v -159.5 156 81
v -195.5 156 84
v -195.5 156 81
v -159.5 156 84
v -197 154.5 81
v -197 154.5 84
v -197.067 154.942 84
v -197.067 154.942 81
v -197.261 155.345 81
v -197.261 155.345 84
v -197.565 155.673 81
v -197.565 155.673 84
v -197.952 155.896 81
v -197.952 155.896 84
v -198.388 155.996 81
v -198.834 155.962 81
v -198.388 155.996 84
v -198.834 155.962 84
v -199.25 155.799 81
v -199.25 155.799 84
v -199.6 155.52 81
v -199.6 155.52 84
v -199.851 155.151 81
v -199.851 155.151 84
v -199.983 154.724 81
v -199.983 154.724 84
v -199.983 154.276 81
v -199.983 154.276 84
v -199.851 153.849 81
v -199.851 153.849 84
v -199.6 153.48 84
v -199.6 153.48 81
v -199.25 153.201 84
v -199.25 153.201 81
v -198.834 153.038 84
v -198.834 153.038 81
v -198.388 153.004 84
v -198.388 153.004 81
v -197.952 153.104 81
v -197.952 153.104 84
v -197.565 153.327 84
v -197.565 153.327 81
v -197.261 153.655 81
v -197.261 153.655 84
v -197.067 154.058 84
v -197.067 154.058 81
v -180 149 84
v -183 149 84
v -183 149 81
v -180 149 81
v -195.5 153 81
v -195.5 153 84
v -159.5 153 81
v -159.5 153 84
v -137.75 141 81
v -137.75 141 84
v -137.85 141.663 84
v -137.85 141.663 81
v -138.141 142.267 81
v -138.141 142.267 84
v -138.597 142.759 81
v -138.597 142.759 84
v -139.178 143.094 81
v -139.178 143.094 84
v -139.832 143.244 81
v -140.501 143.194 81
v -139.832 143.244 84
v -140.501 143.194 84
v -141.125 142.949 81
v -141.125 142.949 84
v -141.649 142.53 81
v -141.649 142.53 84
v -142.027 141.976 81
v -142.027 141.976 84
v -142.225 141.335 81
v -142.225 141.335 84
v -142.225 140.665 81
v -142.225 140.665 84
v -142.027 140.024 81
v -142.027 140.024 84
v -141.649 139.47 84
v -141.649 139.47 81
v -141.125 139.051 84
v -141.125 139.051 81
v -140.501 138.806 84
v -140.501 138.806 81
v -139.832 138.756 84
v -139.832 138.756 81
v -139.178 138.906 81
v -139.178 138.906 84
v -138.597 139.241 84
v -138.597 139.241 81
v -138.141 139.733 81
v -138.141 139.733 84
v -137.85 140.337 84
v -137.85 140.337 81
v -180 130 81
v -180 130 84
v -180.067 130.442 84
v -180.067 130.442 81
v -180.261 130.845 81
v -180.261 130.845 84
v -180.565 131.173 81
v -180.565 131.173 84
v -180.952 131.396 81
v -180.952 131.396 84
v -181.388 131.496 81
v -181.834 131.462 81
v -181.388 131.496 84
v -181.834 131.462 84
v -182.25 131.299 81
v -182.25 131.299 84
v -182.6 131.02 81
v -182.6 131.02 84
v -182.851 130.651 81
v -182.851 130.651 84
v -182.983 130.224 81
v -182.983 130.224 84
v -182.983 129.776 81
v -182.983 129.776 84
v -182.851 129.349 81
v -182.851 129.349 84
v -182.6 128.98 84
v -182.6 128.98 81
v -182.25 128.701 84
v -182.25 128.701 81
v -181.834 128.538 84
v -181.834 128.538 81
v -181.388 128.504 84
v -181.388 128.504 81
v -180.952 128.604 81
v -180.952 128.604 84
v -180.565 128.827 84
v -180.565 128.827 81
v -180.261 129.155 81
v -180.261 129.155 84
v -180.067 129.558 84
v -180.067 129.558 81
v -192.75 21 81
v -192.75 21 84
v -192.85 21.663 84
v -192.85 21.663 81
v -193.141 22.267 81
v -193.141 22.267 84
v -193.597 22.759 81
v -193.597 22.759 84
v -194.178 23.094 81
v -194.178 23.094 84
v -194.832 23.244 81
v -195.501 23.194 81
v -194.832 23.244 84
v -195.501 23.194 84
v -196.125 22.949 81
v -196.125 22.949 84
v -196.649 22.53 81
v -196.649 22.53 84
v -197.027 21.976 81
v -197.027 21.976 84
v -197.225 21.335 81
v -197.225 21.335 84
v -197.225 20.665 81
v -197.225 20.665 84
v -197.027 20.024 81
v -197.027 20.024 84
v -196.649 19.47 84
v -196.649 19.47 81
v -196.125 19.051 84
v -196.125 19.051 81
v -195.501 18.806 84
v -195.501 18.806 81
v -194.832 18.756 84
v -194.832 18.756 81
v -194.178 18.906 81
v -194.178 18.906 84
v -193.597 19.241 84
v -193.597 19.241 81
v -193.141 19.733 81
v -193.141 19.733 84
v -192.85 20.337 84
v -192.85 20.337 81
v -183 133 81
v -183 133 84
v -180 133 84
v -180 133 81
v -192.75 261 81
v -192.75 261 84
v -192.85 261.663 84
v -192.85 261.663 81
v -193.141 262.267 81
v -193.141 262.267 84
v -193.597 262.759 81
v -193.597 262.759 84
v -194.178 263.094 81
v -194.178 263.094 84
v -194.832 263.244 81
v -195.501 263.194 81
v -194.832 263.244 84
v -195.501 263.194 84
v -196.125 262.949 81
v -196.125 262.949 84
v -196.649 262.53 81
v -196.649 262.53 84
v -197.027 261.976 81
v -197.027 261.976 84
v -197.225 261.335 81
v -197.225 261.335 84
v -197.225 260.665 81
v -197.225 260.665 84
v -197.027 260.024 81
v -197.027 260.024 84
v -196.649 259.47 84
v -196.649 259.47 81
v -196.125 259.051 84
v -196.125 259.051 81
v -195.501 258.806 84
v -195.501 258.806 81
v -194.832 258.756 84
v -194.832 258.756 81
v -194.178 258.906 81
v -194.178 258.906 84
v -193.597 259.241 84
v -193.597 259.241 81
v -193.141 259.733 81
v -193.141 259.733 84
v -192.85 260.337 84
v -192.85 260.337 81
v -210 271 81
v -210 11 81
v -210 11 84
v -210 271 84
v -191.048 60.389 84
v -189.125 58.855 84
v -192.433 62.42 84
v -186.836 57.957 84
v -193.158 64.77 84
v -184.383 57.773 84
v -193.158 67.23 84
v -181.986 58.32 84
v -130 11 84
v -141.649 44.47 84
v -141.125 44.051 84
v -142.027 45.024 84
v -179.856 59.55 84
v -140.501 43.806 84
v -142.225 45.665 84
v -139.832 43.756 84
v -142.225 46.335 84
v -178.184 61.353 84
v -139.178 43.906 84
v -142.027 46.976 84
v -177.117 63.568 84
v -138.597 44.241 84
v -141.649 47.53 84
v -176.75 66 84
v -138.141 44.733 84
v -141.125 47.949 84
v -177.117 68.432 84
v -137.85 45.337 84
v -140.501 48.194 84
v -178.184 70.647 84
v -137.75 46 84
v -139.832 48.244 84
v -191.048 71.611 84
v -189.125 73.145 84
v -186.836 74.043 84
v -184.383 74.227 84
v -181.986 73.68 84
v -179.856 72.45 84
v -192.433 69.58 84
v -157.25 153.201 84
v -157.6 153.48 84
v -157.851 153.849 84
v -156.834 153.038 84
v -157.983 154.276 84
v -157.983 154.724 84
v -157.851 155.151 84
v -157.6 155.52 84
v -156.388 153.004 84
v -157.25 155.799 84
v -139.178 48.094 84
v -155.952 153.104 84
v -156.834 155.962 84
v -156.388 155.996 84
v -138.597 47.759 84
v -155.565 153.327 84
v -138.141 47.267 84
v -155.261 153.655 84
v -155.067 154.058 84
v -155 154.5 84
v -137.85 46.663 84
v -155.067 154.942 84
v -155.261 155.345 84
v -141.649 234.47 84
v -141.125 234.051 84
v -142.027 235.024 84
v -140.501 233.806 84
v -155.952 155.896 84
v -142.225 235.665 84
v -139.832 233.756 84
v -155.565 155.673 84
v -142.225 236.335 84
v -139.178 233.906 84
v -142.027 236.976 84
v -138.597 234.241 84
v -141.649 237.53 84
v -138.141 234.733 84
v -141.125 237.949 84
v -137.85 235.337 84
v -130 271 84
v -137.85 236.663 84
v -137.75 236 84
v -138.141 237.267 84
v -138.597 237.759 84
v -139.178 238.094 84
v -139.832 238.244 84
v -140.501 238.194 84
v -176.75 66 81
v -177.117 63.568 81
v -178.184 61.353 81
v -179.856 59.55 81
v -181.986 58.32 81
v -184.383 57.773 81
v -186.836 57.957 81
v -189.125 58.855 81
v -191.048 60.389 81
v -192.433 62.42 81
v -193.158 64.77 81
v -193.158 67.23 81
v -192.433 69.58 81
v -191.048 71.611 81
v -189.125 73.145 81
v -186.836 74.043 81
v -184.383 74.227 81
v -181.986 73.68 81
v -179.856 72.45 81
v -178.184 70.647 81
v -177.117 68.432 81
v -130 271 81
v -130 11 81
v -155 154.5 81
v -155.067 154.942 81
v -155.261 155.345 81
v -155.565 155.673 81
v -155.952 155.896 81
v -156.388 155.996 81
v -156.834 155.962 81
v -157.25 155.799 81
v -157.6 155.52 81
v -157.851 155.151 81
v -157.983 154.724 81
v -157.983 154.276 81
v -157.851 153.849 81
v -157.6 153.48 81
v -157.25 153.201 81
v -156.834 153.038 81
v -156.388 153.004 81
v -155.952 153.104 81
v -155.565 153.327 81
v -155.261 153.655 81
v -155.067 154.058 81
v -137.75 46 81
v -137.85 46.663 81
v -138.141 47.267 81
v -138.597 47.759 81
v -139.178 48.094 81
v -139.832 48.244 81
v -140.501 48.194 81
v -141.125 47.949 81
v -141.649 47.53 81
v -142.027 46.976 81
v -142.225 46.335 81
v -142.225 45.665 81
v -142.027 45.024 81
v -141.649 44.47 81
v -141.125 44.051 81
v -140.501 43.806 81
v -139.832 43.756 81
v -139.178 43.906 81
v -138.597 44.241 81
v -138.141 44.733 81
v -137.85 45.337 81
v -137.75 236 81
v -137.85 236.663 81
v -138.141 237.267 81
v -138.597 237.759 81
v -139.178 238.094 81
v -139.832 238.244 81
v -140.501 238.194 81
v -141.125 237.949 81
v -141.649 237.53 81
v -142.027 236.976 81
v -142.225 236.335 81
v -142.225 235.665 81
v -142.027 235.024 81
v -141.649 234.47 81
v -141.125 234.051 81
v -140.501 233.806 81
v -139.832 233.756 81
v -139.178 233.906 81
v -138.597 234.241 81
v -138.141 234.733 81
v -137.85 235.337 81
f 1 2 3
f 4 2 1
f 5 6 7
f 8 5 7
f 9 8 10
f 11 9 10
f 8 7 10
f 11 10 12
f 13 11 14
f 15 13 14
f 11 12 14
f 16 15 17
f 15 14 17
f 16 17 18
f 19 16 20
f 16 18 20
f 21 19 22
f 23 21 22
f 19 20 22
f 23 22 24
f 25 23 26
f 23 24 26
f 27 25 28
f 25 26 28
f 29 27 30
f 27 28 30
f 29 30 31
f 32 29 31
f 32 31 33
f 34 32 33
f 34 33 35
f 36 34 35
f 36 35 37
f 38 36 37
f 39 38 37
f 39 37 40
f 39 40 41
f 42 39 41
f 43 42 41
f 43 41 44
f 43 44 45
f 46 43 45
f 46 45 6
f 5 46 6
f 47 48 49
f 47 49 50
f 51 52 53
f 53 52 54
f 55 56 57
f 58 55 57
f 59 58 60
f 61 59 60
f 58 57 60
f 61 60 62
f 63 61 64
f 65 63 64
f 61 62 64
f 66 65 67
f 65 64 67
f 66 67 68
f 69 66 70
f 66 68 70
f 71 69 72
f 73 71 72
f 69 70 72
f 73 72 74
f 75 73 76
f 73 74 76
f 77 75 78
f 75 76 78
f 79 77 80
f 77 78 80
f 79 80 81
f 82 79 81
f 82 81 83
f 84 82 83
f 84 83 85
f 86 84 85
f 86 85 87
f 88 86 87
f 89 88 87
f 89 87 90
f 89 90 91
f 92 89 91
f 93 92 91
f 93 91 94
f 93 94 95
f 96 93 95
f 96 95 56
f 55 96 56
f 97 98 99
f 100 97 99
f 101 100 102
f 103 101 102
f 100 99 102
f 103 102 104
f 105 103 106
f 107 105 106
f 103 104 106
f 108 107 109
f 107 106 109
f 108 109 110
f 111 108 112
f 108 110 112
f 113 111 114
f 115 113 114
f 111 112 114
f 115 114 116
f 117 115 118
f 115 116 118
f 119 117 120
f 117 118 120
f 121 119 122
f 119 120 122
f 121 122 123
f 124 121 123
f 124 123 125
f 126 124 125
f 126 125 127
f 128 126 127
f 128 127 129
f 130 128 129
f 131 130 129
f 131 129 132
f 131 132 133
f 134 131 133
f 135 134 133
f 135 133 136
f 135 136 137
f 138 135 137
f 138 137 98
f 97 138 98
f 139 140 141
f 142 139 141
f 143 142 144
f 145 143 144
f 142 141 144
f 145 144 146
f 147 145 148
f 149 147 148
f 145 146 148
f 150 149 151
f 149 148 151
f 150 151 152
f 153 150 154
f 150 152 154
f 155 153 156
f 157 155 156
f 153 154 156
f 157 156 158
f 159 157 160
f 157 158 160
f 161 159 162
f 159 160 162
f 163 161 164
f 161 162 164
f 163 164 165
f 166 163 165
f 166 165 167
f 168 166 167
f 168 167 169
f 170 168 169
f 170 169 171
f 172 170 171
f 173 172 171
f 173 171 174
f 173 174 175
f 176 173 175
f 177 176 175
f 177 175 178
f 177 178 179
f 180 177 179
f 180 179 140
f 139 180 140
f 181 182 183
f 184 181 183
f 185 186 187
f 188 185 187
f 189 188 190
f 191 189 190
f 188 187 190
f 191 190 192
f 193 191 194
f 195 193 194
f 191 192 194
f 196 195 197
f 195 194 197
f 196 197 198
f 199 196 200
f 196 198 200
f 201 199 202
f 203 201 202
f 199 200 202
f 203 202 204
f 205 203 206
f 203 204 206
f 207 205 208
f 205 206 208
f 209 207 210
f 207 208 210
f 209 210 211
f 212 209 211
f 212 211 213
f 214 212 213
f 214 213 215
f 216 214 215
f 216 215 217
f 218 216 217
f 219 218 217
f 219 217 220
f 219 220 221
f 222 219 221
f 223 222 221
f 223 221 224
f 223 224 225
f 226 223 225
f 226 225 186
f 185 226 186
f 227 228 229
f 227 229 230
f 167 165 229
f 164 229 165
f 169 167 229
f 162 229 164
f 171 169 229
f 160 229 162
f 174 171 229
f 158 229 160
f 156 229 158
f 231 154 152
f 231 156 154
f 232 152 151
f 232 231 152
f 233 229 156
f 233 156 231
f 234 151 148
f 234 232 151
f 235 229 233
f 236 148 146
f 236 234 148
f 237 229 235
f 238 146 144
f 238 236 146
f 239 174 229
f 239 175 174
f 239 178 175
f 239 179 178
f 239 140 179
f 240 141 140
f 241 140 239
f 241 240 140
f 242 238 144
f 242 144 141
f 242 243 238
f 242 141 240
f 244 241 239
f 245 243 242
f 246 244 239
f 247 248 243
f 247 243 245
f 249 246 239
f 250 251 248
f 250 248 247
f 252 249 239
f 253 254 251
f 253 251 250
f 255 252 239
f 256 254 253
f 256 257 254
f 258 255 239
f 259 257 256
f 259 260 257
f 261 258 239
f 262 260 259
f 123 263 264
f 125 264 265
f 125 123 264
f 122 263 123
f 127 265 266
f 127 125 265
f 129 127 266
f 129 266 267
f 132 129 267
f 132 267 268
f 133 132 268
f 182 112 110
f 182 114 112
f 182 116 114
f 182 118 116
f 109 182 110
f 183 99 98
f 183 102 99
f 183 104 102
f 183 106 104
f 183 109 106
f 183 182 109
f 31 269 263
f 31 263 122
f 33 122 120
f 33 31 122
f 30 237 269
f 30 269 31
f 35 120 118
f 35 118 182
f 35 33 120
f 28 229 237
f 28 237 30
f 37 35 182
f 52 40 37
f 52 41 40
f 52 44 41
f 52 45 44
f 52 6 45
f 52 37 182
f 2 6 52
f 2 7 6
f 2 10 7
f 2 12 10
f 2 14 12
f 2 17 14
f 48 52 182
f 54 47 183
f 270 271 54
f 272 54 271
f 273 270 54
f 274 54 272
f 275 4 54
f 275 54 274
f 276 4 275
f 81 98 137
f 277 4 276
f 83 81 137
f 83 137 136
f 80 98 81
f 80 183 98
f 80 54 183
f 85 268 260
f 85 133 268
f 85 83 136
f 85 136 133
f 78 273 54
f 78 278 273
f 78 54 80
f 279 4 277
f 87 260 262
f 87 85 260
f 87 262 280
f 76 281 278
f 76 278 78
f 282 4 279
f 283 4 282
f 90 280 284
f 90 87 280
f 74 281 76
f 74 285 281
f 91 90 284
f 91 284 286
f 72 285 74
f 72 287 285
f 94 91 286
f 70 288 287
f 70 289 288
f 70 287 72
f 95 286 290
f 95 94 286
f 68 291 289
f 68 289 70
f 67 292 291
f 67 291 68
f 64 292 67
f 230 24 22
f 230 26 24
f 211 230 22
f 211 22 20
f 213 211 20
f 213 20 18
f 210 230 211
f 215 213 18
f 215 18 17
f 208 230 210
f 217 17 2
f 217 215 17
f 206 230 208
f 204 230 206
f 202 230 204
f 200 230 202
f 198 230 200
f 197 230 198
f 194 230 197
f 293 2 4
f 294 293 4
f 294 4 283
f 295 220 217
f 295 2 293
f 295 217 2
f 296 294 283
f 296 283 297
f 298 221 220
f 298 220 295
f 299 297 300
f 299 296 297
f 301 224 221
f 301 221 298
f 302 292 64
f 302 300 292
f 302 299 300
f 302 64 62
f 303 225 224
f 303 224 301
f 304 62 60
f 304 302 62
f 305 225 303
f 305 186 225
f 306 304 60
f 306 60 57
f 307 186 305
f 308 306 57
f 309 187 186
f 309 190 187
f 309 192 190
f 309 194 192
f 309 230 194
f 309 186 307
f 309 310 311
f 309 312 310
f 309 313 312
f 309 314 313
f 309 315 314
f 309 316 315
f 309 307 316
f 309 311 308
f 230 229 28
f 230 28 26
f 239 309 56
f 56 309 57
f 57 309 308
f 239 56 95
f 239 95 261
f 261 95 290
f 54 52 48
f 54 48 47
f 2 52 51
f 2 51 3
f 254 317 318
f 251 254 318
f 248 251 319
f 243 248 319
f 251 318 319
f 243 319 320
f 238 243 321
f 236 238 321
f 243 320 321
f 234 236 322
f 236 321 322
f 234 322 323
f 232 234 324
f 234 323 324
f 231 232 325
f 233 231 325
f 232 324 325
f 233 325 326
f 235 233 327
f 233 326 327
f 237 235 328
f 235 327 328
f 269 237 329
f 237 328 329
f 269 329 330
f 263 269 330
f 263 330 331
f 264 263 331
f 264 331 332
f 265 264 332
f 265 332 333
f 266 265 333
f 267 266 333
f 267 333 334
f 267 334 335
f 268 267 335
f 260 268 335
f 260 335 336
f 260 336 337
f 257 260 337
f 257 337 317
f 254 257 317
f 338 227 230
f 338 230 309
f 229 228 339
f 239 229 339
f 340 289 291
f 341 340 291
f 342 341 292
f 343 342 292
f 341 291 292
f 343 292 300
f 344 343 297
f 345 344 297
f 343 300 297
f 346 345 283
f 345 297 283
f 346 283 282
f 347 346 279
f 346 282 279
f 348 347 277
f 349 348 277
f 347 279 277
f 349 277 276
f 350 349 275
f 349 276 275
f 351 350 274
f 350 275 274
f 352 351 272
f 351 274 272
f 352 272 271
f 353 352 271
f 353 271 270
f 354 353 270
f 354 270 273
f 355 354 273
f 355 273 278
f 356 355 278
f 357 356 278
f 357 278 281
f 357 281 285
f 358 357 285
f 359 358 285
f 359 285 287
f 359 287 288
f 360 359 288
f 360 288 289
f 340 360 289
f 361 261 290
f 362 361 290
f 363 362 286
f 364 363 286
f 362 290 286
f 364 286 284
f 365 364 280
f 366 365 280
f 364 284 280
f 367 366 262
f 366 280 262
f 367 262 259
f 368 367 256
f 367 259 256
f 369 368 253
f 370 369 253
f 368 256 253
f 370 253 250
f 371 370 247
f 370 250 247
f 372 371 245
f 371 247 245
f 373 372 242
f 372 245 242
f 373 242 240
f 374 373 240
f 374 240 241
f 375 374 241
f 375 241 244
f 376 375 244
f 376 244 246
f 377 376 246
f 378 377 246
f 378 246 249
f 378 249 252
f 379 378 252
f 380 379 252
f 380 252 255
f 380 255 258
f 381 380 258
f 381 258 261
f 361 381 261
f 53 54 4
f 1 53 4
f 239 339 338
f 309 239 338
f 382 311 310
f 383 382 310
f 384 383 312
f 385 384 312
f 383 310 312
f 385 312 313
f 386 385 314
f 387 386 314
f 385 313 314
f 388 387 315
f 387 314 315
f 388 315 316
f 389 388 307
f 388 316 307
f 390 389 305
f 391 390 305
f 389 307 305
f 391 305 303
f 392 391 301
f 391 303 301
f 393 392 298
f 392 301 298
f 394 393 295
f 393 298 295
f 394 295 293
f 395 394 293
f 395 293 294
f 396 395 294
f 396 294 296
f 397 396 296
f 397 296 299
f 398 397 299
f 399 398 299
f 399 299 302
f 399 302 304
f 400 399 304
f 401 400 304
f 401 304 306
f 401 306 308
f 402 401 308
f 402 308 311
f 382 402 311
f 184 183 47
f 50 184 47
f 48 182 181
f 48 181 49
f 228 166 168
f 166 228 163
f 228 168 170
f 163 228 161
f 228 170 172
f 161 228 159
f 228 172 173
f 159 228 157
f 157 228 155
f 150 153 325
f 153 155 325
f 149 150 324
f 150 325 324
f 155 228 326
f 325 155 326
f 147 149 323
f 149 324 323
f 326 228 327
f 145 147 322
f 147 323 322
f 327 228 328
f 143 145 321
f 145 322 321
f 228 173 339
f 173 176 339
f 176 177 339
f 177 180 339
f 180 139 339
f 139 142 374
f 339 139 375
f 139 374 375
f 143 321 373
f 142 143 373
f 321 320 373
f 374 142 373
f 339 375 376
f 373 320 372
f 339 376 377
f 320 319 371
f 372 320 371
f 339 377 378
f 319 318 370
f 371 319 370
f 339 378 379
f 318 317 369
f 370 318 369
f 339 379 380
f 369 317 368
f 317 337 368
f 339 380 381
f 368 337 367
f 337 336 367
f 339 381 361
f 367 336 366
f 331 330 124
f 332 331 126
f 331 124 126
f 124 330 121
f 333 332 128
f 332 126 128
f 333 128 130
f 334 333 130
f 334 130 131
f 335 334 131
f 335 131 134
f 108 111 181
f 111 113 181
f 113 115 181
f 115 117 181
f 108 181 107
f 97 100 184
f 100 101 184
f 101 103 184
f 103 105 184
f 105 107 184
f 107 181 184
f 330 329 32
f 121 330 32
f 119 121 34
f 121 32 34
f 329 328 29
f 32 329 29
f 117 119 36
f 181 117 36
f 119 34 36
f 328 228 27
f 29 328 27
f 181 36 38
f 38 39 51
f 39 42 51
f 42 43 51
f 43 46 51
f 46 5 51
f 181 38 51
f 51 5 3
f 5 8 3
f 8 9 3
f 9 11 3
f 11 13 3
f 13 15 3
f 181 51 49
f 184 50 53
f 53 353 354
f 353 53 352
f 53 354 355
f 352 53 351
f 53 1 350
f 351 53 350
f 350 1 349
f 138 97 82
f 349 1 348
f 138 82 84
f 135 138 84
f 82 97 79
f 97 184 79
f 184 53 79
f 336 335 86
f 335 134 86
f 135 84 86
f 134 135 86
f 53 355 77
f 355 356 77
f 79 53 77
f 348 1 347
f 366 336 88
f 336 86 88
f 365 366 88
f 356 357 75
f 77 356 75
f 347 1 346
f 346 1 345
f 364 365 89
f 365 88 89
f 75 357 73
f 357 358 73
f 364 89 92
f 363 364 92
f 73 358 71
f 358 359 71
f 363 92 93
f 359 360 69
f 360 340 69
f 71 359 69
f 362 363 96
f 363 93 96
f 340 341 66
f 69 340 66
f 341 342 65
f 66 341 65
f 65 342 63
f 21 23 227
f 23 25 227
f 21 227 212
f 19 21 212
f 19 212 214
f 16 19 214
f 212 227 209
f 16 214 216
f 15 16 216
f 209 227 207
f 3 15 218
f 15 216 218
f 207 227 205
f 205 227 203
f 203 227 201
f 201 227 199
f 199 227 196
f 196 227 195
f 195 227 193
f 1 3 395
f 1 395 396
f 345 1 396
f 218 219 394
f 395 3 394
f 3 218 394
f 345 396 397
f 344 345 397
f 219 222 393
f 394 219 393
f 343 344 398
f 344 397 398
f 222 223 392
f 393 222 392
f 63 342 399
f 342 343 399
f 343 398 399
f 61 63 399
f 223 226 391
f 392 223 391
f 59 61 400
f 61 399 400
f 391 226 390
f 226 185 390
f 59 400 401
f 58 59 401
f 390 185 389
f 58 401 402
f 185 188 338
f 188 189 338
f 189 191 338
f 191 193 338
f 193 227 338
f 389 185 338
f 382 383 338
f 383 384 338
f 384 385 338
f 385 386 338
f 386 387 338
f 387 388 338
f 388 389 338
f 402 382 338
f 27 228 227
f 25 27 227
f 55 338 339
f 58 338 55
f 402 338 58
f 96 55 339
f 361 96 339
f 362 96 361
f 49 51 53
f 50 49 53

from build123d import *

# Parameters (mm, degrees)
SKETCH_W        = 80
SKETCH_H        = 260
PAD_DEPTH       = 3
SKETCH004_R     = 2.25
HOLE002_DEPTH   = 3.001
SKETCH006_R     = 1.5
SKETCH006_W     = 36
SKETCH006_H     = 3
SKETCH006_W_2   = 3
SKETCH006_H_2   = 16
POCKET_DEPTH    = 3.001
SKETCH012_R     = 8.25
POCKET003_DEPTH = 3.001


with BuildPart() as part:
    # Sketch → Pad (new body)
    with BuildSketch(Plane.XY):
        Rectangle(SKETCH_W, SKETCH_H)
    extrude(amount=PAD_DEPTH)

    # Sketch004 (on Face6 of Pad) → Hole002 (cut, through all)
    with BuildSketch(Plane.XY.offset(3)):
        with Locations((-25, -120)):
            Circle(SKETCH004_R)
        with Locations((-25, 120)):
            Circle(SKETCH004_R)
        with Locations((30, 0)):
            Circle(SKETCH004_R)
        with Locations((30, -95)):
            Circle(SKETCH004_R)
        with Locations((30, 95)):
            Circle(SKETCH004_R)
    extrude(amount=-HOLE002_DEPTH, mode=Mode.SUBTRACT)

    # Sketch006 (on Face5 of Hole002) → Pocket (cut, through all)
    with BuildSketch(Plane.XY.offset(3)):
        with Locations((-28.5, 13.5)):
            Circle(SKETCH006_R)
        with Locations((13.5, 13.5)):
            Circle(SKETCH006_R)
        with Locations((-11.5, -11)):
            Circle(SKETCH006_R)
        with Locations((-7.5, 13.5)):
            Rectangle(SKETCH006_W, SKETCH006_H)
        with Locations((-11.5, 0)):
            Rectangle(SKETCH006_W_2, SKETCH006_H_2)
    extrude(amount=-POCKET_DEPTH, mode=Mode.SUBTRACT)

    # Sketch012 (on Face4 of Pocket) → Pocket003 (cut, through all)
    with BuildSketch(Plane(origin=(0, 0, 0), x_dir=(1, 0, 0), z_dir=(0, 0, -1))):
        with Locations((-15, 75)):
            Circle(SKETCH012_R)
    extrude(amount=-POCKET003_DEPTH, mode=Mode.SUBTRACT)


with BuildPart() as part_1:
    # Body placement: moved
    add(part.part.moved(Location((-170, 141, 81))))


solid = part_1.part
